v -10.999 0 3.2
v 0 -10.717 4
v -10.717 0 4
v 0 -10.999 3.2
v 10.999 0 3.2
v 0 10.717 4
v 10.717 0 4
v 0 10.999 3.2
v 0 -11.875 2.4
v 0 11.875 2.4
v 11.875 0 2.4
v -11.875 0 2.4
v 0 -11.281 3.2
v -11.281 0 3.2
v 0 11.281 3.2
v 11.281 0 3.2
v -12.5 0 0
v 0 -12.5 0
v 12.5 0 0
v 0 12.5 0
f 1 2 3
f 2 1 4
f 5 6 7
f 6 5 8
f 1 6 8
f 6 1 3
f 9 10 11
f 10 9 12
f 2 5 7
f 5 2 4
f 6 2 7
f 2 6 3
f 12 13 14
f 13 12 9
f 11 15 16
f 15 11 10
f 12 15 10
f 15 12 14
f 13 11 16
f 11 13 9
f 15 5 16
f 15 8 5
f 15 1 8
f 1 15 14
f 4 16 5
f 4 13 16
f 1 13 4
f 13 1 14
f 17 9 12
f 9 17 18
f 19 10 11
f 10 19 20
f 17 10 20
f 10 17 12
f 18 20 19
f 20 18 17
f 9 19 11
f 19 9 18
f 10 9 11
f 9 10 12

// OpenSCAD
// file: ../build.scad
$build_id = "";

function building(filename) = is_undef(filename) ?
  !is_undef(build)
  : !is_undef(build) && build == filename;

function previewing() = !building();

module build(filename) {
  $build_id = filename;

  if(!is_undef(scad_build_scan) && scad_build_scan == true) {
    echo(str("scad_build_scan: ", filename));
  }
  else if(previewing() || build == filename) {
    children();
  }
}

module preview_row(spacing) {
  if(previewing()) {
    for(x = [0:1:$children - 1]) {
      translate([x * spacing, 0, 0]) {
        children(x);
      }
    }
  }
  else {
    children();
  }
}

module preview_column(spacing) {
  if(previewing()) {
    for(y = [0:1:$children - 1]) {
      translate([0, y * spacing, 0]) {
        children(y);
      }
    }
  }
  else {
    children();
  }
}
// file: ../minibase.scad
// Based off of titancraft's Customizable Miniature Base (CC0 1.0)
// https://www.thingiverse.com/thing:1112237

include <./build.scad>

$base_rim = 1; //	[1: tapered, 2: inclined, 3: flat]
// Number of sides:
$base_shape = 100; //	[30:Low-res Circle, 100: Hi-res Circle, 5:Pentagon, 6:Hexagon, 8:Octagon, 4:Square, 3:Triangle]

$base_diameter = 32;
$base_height = 4;
$base_slant = 95;

// Percentage:
$base_stretch = 100;

//(tapered base only)
$base_inner_circle_ratio = 40;

module tapered(r=40) {
  $base_rim = 1;
  $base_inner_circle_ratio = r;

  children();
}

module inclined() {
  $base_rim = 2;

  children();
}

module flat() {
  $base_rim = 3;

  children();
}

module shape(s) {
  $base_shape = s;

  children();
}

module diameter(d) {
  $base_diameter = d;

  children();
}

module height(h) {
  $base_height = h;

  children();
}

module slant(s) {
  $base_slant = s;

  children();
}

module stretch(s) {
  $base_stretch = s;

  children();
}

module base(id) {
  build(id) union() {
    radius = $base_diameter/2;
    scale([$base_stretch/100, 1, 1]){
      if ($base_rim == 1){
        // tapered base
        cyl1_height = $base_height * (1-$base_inner_circle_ratio/100);
        cylinder(cyl1_height, radius, radius * $base_slant/100, $fn=$base_shape);

        cyl2_radius = radius  * $base_slant/100 * .95;
        cyl2_height = $base_height - cyl1_height;

        translate([0, 0, cyl1_height]){
          cylinder(cyl2_height, cyl2_radius, cyl2_radius * $base_slant/100, $fn=$base_shape);
          cylinder(cyl2_height*.5, radius * $base_slant/100, cyl2_radius, $fn=$base_shape);
        }
      } else if ($base_rim == 2){
        // inclined base
        cylinder($base_height, radius, radius * $base_slant/100, $fn=$base_shape);
      } else if ($base_rim == 3){
        // flat base

        cylinder($base_height, radius, radius, $fn=$base_shape);
      }
    }
  }
}
// main file
include <../minibase.scad>

tapered() diameter(25) shape(4) base("25mm-gen-square");
